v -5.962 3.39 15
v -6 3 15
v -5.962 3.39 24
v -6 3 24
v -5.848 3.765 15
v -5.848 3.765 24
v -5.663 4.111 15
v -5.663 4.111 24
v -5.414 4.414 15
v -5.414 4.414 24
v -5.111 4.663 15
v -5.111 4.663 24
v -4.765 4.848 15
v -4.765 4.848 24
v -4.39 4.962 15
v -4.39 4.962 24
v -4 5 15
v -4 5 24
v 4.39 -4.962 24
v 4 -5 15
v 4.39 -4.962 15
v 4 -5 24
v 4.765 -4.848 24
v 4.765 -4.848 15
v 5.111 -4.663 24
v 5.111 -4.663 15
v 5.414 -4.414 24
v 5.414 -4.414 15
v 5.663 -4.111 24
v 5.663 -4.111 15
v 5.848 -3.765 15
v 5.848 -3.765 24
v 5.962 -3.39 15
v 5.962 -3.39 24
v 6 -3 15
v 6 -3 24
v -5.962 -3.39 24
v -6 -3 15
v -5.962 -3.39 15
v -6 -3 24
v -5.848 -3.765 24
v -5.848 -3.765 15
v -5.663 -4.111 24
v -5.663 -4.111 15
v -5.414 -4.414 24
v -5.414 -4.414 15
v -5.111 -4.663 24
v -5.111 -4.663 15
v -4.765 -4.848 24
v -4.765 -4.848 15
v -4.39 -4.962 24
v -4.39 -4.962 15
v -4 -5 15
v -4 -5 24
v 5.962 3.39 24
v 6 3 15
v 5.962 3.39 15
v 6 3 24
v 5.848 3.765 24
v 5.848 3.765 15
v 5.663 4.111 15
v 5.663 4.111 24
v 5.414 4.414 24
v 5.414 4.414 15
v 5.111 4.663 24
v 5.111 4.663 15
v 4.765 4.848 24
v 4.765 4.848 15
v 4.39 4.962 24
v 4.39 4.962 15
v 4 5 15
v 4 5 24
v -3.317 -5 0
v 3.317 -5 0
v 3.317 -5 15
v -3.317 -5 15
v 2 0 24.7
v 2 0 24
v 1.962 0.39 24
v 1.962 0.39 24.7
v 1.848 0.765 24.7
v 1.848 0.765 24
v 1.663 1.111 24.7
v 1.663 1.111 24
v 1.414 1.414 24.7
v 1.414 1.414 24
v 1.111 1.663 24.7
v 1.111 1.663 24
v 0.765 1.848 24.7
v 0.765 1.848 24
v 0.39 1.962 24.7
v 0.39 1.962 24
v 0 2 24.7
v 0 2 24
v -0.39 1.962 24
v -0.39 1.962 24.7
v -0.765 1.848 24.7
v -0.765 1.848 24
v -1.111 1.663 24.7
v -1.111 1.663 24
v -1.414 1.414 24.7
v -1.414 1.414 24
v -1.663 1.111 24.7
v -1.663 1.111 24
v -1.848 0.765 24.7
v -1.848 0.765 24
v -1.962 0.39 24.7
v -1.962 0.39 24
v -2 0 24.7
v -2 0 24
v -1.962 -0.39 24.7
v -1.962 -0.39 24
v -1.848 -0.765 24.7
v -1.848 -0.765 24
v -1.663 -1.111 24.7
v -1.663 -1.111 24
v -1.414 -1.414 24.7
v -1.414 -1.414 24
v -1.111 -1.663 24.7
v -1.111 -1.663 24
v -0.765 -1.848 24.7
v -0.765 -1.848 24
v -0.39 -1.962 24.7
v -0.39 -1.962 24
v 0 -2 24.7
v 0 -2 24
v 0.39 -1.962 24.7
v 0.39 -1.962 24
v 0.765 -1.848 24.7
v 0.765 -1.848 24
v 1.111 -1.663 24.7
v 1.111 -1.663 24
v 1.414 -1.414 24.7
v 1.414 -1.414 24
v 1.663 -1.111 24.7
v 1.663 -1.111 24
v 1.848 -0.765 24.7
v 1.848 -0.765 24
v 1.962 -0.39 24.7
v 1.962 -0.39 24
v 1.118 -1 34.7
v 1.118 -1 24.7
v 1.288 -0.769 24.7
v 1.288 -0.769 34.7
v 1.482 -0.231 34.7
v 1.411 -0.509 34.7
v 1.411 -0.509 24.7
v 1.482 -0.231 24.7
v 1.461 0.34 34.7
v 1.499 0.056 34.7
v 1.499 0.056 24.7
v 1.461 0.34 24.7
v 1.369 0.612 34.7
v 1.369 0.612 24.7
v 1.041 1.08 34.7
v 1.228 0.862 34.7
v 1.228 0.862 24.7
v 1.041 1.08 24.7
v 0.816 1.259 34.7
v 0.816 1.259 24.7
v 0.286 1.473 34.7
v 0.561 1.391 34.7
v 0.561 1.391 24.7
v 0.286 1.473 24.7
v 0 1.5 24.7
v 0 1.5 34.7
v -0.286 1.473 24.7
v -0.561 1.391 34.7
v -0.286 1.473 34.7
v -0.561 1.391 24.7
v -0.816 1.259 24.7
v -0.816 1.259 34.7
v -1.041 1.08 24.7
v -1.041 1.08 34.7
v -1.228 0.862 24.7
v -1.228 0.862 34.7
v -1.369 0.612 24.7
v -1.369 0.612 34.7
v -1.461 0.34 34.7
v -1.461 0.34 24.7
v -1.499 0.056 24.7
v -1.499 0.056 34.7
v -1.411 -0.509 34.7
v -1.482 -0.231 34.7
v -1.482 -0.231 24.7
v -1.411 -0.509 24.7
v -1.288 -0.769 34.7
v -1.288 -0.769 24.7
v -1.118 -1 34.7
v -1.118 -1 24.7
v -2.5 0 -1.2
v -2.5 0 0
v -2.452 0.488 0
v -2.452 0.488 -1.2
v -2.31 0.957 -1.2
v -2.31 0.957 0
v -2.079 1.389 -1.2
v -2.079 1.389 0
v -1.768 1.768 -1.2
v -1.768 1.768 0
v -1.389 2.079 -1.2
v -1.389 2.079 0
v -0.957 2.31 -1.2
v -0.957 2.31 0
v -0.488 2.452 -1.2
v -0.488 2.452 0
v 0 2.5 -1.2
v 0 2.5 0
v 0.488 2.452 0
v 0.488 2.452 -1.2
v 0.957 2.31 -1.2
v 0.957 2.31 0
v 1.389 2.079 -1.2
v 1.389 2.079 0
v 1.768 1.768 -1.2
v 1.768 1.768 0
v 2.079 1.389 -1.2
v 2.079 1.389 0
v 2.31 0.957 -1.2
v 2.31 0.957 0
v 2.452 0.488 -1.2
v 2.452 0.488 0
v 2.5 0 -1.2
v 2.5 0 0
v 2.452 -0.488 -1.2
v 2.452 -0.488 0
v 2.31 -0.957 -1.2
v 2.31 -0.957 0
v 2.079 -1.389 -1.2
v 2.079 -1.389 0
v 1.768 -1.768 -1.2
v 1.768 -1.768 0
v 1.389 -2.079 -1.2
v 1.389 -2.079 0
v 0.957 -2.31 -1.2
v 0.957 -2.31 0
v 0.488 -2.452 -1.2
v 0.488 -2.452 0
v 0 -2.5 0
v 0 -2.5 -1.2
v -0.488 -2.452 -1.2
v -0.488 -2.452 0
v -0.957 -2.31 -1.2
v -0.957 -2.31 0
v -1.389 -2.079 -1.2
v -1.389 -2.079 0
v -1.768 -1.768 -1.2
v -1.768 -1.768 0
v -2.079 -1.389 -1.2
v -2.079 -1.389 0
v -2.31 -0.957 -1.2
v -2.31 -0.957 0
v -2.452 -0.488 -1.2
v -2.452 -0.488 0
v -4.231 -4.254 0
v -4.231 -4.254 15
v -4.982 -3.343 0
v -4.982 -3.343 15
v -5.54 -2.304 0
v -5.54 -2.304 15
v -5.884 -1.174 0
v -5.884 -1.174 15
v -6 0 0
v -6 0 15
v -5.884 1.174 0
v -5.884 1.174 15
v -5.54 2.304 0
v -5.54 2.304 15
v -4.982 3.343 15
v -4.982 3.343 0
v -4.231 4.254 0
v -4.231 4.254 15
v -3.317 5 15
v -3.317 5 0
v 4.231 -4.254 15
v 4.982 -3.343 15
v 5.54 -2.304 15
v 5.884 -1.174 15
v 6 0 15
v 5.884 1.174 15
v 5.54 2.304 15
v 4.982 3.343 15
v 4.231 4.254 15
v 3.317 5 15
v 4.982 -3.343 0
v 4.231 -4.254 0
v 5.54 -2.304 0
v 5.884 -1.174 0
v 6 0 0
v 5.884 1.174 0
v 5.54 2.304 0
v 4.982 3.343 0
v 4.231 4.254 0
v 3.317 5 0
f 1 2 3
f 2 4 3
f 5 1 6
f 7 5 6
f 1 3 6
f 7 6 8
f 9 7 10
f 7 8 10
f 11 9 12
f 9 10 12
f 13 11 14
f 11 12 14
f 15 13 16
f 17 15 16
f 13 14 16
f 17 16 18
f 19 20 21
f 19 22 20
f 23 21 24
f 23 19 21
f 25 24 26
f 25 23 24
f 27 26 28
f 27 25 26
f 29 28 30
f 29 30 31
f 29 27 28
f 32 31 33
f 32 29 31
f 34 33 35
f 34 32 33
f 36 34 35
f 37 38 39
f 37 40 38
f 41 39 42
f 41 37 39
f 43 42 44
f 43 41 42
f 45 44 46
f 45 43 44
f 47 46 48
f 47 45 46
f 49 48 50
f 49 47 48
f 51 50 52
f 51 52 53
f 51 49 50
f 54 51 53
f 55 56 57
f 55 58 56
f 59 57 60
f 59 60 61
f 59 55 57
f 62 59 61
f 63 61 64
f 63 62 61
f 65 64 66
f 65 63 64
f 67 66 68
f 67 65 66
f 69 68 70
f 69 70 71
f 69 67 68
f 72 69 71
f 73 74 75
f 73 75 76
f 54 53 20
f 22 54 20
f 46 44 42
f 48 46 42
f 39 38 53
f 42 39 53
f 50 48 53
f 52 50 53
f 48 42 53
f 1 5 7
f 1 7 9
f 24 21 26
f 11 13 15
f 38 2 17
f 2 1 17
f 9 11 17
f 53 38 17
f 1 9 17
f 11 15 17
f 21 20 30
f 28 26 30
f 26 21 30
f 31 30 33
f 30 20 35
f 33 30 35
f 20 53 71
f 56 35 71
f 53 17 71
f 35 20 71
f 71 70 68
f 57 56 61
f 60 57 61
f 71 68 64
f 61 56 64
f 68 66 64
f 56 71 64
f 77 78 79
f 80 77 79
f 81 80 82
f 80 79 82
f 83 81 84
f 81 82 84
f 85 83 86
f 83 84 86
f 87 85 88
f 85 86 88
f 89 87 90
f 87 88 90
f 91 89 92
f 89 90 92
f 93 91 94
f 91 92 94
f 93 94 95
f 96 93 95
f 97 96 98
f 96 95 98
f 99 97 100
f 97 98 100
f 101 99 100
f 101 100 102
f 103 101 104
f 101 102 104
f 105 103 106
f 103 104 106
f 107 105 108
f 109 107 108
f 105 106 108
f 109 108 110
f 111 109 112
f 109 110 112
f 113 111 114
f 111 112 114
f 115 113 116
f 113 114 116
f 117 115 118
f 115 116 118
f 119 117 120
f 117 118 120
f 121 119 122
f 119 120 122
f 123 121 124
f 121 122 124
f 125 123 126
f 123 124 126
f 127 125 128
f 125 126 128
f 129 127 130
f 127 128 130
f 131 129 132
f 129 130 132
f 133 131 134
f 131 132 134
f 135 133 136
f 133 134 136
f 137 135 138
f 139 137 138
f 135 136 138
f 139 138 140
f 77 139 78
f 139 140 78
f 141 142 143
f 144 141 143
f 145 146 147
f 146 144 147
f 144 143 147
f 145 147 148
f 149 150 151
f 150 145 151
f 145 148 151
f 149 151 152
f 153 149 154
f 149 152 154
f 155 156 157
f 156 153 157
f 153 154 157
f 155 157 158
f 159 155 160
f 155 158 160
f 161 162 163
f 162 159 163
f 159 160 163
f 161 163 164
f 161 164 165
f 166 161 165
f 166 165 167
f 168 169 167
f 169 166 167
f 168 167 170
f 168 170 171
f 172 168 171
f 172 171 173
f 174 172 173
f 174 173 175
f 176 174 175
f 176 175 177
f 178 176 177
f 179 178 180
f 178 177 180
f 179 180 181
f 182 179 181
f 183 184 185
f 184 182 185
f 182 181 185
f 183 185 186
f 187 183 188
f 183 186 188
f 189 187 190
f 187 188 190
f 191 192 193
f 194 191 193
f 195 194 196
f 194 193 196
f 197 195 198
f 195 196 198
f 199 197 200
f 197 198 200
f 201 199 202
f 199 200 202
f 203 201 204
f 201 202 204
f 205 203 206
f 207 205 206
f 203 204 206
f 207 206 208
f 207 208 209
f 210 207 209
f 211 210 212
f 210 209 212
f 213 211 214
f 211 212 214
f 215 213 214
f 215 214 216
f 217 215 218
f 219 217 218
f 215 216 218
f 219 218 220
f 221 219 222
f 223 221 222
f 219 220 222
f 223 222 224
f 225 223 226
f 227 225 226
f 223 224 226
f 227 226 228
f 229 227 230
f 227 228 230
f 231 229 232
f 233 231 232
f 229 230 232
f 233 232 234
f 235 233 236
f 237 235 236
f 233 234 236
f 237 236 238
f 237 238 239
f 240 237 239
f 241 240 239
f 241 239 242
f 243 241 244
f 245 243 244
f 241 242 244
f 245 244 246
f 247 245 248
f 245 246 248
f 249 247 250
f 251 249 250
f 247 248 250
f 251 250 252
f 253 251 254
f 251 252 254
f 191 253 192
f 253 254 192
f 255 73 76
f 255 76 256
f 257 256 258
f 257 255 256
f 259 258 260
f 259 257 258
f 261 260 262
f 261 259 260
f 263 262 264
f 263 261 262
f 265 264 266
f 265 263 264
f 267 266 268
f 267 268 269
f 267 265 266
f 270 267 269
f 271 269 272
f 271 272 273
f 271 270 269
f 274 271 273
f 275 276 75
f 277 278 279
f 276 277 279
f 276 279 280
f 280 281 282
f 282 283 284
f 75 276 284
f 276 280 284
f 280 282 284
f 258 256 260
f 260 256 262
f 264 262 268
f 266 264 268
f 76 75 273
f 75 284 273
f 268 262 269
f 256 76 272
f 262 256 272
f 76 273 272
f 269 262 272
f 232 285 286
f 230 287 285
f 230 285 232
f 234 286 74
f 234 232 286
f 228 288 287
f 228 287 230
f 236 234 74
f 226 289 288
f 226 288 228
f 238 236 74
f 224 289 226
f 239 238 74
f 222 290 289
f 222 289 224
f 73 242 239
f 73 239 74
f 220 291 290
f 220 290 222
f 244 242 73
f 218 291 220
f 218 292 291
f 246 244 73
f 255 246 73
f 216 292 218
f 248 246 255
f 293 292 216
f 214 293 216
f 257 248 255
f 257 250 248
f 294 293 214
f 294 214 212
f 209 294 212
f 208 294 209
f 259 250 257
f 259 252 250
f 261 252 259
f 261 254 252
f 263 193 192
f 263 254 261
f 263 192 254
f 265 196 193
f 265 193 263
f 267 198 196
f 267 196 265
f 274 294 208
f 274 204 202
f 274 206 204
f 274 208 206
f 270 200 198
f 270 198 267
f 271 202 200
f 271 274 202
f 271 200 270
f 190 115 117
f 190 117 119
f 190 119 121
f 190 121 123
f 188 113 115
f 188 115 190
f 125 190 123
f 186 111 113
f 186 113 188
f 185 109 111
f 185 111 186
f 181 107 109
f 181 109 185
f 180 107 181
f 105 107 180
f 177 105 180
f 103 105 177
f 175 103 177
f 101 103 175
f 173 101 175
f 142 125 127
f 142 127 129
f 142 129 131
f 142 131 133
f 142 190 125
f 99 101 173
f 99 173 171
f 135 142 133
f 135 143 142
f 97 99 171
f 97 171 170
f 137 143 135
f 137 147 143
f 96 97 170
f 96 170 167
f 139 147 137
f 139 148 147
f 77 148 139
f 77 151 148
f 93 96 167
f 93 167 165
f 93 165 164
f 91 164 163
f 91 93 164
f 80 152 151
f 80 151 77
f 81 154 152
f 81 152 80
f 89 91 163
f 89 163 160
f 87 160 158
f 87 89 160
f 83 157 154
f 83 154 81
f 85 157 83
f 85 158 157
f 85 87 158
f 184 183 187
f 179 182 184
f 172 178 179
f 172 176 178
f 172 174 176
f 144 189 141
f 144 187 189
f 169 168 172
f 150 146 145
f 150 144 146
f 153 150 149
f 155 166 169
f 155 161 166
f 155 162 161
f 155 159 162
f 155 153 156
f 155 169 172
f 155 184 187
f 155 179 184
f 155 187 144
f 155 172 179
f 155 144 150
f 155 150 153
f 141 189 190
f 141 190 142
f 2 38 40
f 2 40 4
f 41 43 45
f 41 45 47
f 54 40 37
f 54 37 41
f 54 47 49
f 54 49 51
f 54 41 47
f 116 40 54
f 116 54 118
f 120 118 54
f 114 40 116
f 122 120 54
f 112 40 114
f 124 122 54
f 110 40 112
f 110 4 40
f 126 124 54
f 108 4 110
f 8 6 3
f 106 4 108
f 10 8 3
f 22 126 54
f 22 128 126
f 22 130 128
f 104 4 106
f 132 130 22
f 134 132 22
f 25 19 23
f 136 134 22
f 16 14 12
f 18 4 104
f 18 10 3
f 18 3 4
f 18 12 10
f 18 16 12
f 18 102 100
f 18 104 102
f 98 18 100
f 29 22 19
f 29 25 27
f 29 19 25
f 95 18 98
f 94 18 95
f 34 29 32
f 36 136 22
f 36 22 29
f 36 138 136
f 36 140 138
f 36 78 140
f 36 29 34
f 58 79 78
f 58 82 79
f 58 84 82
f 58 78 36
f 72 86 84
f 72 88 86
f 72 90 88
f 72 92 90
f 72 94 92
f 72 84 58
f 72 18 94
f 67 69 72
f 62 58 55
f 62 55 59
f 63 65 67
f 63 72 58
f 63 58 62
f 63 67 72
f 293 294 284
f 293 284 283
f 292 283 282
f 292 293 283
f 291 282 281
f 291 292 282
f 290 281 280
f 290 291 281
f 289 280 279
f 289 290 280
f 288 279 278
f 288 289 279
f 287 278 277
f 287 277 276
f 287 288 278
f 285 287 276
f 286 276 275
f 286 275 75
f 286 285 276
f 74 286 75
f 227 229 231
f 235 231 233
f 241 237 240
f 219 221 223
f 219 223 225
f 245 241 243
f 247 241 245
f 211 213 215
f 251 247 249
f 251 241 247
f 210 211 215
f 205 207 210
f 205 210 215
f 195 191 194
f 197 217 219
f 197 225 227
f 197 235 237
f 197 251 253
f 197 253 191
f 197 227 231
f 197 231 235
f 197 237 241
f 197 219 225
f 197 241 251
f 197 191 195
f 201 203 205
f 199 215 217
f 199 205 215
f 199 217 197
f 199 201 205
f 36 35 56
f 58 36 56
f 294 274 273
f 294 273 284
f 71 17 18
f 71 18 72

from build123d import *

# Parameters (mm, degrees)
EXTRUDE_406_DEPTH      = 15
SKETCH2_R              = 2.5
EXTRUDE_567_DEPTH      = 1.2
SKETCH5_W              = 12
SKETCH5_H              = 10
EXTRUDE_774_DEPTH      = 9
FILLET_814_R           = 2
SKETCH6_R              = 2
EXTRUDE_1143_DEPTH     = 0.7
SKETCH7_R              = 1.5
EXTRUDE_1228_DEPTH     = 10
CUT_EXTRUDE_1344_DEPTH = 10


with BuildPart() as part:
    # Sketch9 → Extrude 406 (new body)
    with BuildSketch(Plane.XY):
        with BuildLine():
            Line((-3.31662479, 5), (3.31662479, 5))
            ThreePointArc((3.31662479, 5), (6, 0), (3.31662479, -5))
            Line((3.31662479, -5), (-3.31662479, -5))
            ThreePointArc((-3.31662479, -5), (-6, 0), (-3.31662479, 5))
        make_face()
    extrude(amount=EXTRUDE_406_DEPTH)

    # Sketch2 → Extrude 567 (add)
    with BuildSketch(Plane(origin=(0, 0, 0), x_dir=(-1, 0, 0), z_dir=(0, 0, -1))):
        Circle(SKETCH2_R)
    extrude(amount=EXTRUDE_567_DEPTH)


with BuildPart() as body_2:
    # Sketch5 → Extrude 774 (new body)
    with BuildSketch(Plane.XY.offset(15)):
        Rectangle(SKETCH5_W, SKETCH5_H)
    extrude(amount=EXTRUDE_774_DEPTH)

    # Fillet 814
    fillet_814_edges = [body_2.edges().sort_by_distance(p)[0] for p in [
        (6, -5, 19.5),
        (-6, -5, 19.5),
        (-6, 5, 19.5),
        (6, 5, 19.5),
    ]]
    fillet(fillet_814_edges, radius=FILLET_814_R)

    # Sketch6 → Extrude 1143 (add)
    with BuildSketch(Plane.XY.offset(24)):
        Circle(SKETCH6_R)
    extrude(amount=EXTRUDE_1143_DEPTH)

    # Sketch7 → Extrude 1228 (add)
    with BuildSketch(Plane.XY.offset(24.7)):
        Circle(SKETCH7_R)
    extrude(amount=EXTRUDE_1228_DEPTH)

    # Sketch8 → Cut-Extrude 1344 (cut)
    with BuildSketch(Plane.XY.offset(34.7)):
        with BuildLine():
            Line((-1.118033989, -1), (1.118033989, -1))
            ThreePointArc((1.118033989, -1), (0, -1.5), (-1.118033989, -1))
        make_face()
    extrude(amount=-CUT_EXTRUDE_1344_DEPTH, mode=Mode.SUBTRACT)


solid = Compound([part.part, body_2.part])
